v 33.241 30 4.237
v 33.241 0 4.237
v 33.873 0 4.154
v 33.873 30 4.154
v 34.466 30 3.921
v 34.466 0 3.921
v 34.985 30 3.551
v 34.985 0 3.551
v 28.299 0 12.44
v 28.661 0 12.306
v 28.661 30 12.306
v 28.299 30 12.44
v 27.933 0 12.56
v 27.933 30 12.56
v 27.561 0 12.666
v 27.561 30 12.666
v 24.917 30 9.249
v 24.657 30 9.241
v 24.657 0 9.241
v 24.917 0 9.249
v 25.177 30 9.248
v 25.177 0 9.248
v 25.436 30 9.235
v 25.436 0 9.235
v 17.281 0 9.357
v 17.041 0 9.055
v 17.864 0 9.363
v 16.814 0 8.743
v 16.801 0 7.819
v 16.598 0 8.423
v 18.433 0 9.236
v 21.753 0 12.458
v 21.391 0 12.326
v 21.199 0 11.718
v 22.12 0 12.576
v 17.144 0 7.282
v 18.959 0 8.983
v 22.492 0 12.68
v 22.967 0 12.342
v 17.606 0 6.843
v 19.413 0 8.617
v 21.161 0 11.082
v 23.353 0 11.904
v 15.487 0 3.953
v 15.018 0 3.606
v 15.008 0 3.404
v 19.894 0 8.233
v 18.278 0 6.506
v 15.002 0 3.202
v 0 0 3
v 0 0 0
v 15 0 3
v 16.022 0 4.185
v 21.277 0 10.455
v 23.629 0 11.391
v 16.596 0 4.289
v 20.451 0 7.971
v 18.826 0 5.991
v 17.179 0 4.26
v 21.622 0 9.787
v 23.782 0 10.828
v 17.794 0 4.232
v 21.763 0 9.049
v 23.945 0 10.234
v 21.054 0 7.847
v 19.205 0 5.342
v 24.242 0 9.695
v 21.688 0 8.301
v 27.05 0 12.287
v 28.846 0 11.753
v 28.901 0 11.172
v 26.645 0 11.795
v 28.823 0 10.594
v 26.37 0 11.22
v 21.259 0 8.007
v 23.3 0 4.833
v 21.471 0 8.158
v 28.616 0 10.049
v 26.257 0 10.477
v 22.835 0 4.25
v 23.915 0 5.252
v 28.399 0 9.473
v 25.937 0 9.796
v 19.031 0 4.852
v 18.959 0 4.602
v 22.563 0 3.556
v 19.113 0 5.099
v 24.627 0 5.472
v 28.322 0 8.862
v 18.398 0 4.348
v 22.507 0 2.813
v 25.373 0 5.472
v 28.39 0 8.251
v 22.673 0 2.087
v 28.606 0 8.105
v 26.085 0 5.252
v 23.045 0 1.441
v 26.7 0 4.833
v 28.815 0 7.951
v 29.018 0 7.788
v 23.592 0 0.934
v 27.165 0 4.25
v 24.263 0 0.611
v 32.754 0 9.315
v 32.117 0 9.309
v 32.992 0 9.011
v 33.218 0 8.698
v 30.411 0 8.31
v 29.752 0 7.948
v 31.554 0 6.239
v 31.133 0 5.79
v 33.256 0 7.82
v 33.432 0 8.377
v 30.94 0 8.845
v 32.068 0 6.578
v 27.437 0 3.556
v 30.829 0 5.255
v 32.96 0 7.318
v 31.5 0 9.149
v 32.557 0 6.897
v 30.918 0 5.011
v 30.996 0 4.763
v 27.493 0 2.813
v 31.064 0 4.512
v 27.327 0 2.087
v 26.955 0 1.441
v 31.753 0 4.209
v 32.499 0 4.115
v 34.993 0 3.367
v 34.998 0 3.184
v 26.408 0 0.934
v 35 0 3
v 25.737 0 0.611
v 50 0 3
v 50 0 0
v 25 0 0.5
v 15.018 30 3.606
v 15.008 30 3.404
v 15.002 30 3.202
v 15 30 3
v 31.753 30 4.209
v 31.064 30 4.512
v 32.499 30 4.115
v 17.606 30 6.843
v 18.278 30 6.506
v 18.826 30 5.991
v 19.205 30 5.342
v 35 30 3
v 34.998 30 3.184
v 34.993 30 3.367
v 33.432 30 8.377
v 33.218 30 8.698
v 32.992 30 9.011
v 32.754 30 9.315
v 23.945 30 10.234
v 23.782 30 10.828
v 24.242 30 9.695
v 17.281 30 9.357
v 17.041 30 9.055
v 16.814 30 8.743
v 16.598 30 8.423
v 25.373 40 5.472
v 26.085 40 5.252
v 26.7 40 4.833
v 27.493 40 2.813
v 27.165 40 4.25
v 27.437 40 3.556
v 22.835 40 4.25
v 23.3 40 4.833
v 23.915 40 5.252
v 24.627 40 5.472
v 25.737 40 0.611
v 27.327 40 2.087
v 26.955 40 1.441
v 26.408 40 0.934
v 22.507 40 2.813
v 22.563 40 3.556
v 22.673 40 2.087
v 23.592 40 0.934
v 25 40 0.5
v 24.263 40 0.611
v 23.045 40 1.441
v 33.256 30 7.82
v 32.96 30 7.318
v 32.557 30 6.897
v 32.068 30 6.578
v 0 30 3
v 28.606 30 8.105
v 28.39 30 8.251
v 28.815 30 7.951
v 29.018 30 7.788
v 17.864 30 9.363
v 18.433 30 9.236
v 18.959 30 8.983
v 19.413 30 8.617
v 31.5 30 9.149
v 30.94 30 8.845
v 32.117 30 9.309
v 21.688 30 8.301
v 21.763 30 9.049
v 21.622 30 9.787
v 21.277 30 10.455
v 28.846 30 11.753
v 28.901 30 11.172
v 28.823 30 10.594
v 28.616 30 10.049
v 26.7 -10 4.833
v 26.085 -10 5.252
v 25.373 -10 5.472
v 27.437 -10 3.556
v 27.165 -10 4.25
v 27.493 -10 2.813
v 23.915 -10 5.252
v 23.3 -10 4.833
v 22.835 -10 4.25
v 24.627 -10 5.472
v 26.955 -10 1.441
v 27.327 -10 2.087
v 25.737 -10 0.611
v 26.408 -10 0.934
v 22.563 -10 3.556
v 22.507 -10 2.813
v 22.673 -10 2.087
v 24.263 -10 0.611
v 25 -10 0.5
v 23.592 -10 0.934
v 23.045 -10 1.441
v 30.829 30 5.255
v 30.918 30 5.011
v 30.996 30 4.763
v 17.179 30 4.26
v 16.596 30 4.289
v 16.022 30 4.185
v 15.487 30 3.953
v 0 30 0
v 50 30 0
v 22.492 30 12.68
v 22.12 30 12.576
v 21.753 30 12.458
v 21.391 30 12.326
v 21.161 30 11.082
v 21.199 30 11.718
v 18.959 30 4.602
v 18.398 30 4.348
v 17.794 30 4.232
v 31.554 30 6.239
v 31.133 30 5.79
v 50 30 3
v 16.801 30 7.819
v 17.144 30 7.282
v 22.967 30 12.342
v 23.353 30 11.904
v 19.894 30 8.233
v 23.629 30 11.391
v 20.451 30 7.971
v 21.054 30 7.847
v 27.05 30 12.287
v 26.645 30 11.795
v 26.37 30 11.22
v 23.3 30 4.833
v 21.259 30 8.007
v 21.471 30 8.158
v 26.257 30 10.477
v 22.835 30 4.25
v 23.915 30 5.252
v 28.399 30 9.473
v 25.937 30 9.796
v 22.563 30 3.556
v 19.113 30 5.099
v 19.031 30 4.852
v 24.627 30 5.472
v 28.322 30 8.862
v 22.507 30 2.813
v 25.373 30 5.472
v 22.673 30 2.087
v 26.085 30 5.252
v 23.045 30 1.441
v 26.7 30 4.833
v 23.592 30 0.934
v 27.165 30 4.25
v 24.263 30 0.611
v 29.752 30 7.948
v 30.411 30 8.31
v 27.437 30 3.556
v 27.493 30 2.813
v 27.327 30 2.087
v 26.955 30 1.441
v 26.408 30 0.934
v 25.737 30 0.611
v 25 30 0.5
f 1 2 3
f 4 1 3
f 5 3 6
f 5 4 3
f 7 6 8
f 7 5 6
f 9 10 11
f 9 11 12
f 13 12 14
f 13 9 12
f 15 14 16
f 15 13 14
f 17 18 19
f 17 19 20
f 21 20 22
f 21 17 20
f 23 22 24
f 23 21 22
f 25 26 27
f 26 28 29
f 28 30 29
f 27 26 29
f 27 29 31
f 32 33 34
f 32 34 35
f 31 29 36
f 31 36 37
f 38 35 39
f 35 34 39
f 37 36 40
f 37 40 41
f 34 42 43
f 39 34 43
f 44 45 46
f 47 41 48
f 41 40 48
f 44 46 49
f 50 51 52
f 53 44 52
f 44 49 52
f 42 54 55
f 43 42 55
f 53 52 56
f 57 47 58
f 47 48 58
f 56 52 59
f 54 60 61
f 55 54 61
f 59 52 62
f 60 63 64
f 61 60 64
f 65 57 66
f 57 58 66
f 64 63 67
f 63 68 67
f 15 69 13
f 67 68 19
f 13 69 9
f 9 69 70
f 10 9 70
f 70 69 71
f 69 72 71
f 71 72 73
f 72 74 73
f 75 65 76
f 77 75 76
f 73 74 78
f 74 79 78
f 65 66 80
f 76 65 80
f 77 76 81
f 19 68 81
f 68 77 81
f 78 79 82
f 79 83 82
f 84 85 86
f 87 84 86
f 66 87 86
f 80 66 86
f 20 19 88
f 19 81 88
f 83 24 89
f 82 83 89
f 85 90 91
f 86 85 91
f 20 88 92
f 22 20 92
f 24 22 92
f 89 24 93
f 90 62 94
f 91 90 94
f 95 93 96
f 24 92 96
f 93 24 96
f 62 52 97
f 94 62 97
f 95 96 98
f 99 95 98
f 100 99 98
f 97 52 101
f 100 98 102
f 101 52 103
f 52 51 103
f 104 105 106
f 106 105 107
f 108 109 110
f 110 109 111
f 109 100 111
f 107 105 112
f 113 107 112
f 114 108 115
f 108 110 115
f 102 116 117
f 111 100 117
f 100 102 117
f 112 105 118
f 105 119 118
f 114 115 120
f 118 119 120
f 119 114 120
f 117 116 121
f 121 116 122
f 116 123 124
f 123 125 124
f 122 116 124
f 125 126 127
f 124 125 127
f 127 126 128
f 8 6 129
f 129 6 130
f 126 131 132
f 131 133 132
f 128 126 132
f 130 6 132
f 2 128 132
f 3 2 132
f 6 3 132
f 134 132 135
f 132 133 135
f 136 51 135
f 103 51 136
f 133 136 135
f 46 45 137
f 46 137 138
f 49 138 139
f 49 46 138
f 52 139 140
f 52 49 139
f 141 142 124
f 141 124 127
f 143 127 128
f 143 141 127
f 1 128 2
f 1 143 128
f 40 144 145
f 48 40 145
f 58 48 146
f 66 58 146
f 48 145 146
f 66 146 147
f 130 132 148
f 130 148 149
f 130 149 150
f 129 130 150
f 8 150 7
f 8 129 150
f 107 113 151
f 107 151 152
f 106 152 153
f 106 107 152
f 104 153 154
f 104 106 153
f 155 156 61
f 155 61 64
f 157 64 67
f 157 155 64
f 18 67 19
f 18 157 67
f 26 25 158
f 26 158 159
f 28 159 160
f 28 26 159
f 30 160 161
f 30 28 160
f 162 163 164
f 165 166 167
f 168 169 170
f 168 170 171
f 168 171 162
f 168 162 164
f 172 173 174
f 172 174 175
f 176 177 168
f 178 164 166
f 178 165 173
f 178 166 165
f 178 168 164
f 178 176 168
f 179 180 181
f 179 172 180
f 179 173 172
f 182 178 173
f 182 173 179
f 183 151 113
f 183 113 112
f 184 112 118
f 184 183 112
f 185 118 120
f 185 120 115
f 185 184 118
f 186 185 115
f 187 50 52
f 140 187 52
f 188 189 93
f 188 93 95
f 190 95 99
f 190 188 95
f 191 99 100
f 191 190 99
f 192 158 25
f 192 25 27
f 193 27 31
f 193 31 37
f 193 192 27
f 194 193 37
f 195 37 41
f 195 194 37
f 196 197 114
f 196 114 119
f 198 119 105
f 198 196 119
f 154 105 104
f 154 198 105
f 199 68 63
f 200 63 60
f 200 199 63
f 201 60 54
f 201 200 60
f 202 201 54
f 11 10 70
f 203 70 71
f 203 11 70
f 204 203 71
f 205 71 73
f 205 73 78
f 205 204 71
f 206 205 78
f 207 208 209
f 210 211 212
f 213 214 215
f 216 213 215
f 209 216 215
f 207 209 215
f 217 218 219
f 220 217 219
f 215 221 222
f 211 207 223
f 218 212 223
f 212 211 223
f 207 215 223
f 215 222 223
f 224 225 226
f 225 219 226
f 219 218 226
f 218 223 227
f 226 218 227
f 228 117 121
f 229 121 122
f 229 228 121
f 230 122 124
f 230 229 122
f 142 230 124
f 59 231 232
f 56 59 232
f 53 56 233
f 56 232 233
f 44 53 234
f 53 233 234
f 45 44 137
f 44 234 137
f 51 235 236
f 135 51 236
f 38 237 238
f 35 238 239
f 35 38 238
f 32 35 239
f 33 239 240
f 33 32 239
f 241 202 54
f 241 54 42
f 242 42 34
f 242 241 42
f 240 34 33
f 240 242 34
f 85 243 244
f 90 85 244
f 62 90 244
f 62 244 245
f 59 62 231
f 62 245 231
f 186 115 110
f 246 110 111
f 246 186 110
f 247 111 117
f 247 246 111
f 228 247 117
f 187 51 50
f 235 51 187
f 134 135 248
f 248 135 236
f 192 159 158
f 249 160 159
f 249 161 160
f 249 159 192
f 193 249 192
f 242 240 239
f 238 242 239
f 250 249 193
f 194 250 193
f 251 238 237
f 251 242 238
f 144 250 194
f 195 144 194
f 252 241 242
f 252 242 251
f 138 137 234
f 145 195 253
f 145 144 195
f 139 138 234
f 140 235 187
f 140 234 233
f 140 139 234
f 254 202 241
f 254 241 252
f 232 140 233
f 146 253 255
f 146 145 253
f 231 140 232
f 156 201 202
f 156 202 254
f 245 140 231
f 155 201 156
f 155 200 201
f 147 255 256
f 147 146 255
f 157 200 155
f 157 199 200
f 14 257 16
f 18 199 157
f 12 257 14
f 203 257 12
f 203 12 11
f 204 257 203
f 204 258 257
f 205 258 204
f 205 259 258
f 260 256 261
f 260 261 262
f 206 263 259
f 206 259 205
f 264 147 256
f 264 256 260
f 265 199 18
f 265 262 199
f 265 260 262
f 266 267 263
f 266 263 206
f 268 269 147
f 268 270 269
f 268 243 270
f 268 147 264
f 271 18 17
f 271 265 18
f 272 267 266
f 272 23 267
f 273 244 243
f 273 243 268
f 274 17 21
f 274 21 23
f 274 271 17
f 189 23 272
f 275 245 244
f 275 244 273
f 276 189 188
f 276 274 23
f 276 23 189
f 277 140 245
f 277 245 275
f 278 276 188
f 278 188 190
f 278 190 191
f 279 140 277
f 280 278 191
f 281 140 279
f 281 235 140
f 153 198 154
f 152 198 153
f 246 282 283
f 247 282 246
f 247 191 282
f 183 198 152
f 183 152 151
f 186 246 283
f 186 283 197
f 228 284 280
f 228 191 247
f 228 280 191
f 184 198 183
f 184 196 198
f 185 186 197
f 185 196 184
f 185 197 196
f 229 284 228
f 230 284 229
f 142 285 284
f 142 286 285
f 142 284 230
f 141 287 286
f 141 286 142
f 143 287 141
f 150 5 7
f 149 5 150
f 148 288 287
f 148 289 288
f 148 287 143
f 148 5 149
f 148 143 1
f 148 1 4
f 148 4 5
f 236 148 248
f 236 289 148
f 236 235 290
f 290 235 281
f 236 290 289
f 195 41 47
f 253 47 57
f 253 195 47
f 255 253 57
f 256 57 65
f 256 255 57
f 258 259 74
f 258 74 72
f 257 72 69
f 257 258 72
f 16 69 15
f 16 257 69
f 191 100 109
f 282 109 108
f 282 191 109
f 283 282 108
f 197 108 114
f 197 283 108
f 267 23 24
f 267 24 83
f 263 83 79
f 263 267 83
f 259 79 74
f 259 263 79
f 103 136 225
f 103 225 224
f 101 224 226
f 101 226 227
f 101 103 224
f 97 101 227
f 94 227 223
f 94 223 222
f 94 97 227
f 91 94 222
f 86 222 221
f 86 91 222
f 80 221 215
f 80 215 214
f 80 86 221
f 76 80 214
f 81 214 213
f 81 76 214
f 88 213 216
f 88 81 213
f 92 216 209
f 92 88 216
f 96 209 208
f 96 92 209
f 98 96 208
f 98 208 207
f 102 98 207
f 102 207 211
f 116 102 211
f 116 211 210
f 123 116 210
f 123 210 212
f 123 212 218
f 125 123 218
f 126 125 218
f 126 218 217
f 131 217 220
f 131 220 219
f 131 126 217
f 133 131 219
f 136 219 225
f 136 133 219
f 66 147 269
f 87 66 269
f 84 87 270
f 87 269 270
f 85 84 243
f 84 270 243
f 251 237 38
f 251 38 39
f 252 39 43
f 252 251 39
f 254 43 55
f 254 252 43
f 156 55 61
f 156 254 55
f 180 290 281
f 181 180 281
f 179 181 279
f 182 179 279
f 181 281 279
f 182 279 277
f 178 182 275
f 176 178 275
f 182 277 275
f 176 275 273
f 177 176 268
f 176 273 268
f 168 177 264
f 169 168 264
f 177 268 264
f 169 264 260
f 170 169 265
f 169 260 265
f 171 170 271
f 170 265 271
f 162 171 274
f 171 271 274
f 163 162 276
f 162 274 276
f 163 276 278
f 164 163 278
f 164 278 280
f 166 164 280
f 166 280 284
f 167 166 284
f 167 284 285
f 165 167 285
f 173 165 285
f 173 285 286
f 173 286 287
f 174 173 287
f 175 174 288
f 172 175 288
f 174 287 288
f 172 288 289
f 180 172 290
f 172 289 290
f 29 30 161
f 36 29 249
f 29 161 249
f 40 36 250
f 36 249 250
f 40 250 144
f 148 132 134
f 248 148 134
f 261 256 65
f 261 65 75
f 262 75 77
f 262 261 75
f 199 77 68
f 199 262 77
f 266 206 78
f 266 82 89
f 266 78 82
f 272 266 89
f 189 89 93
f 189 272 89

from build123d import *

# Parameters (mm, degrees)
CROQUIS1_W                   = 50
CROQUIS1_H                   = 30
SALIENTE_EXTRUIR1_DEPTH      = 3
SALIENTE_EXTRUIR2_DEPTH      = 15
SALIENTE_EXTRUIR2_DEPTH_BACK = 15
CORTAR_EXTRUIR1_DEPTH        = 60.741108125
CROQUIS4_R                   = 2.5
SALIENTE_EXTRUIR3_DEPTH      = 10


with BuildPart() as part:
    # Croquis1 → Saliente-Extruir1 (new body)
    with BuildSketch(Plane.XY):
        with Locations((25, 15)):
            Rectangle(CROQUIS1_W, CROQUIS1_H)
    extrude(amount=SALIENTE_EXTRUIR1_DEPTH)

    # Croquis2 → Saliente-Extruir2 (add, two sides: drawn at the far end of the back side and taken through both)
    with BuildSketch(Plane(origin=(0, 15, 0), x_dir=(1, 0, 0), z_dir=(0, 1, 0)).offset(-SALIENTE_EXTRUIR2_DEPTH_BACK)):
        with BuildLine():
            Line((15, -3), (35, -3))
            ThreePointArc((35, -3), (25, -13), (15, -3))
        make_face()
    extrude(amount=SALIENTE_EXTRUIR2_DEPTH + SALIENTE_EXTRUIR2_DEPTH_BACK)

    # Croquis3 → Cortar-Extruir1 (cut, through all)
    with BuildSketch(Plane(origin=(0, 30, 0), x_dir=(1, 0, 0), z_dir=(0, 1, 0))):
        with BuildLine():
            ThreePointArc((17.281029865, -9.357475919), (18.433447729, -9.235618719), (19.413280597, -8.616875104))
            ThreePointArc((19.413280597, -8.616875104), (20.164937796, -8.08539476), (21.05409871, -7.846956572))
            ThreePointArc((21.05409871, -7.846956572), (21.364087604, -8.083627253), (21.688234212, -8.300503029))
            ThreePointArc((21.688234212, -8.300503029), (21.719260259, -9.423145978), (21.277056507, -10.455495555))
            ThreePointArc((21.277056507, -10.455495555), (21.160716532, -11.401170735), (21.390501043, -12.325852094))
            ThreePointArc((21.390501043, -12.325852094), (19.144543803, -11.106394558), (17.281029865, -9.357475919))
        make_face()
        with BuildLine():
            ThreePointArc((17.605845109, -6.843331325), (18.570395316, -6.268063818), (19.205167685, -5.34158994))
            ThreePointArc((19.205167685, -5.34158994), (19.070403954, -4.975605156), (18.958729207, -4.601927653))
            ThreePointArc((18.958729207, -4.601927653), (18.099232466, -4.272192527), (17.17873271, -4.260356141))
            ThreePointArc((17.17873271, -4.260356141), (16.022342896, -4.184998931), (15.018391395, -3.606209252))
            ThreePointArc((15.018391395, -3.606209252), (15.498017257, -6.116460163), (16.598255677, -8.423162576))
            ThreePointArc((16.598255677, -8.423162576), (16.955870168, -7.540015696), (17.605845109, -6.843331325))
        make_face()
        with BuildLine():
            ThreePointArc((22.492052569, -12.680402868), (23.35275234, -11.904444098), (23.781765411, -10.827938688))
            ThreePointArc((23.781765411, -10.827938688), (24.07747255, -9.956149042), (24.65666839, -9.240612823))
            ThreePointArc((24.65666839, -9.240612823), (25.046566209, -9.249876526), (25.436282706, -9.234804119))
            ThreePointArc((25.436282706, -9.234804119), (26.121256275, -10.12480469), (26.370305781, -11.219913886))
            ThreePointArc((26.370305781, -11.219913886), (26.832038689, -12.053364099), (27.561452328, -12.666383086))
            ThreePointArc((27.561452328, -12.666383086), (25.027655598, -12.999961758), (22.492052569, -12.680402868))
        make_face()
        with BuildLine():
            ThreePointArc((28.661025949, -12.305744946), (28.90124957, -11.172074481), (28.615574431, -10.048995755))
            ThreePointArc((28.615574431, -10.048995755), (28.342381435, -9.16989082), (28.390379076, -8.250567086))
            ThreePointArc((28.390379076, -8.250567086), (28.711258105, -8.028885391), (29.017686036, -7.787621948))
            ThreePointArc((29.017686036, -7.787621948), (30.094970504, -8.105030174), (30.940144821, -8.844604497))
            ThreePointArc((30.940144821, -8.844604497), (31.803584335, -9.24748009), (32.754015885, -9.314684288))
            ThreePointArc((32.754015885, -9.314684288), (30.900203893, -11.073883453), (28.661025949, -12.305744946))
        make_face()
        with BuildLine():
            ThreePointArc((33.43161185, -8.376608746), (32.959602062, -7.318250172), (32.068356907, -6.57757603))
            ThreePointArc((32.068356907, -6.57757603), (31.330614215, -6.026944012), (30.829080189, -5.254983182))
            ThreePointArc((30.829080189, -5.254983182), (30.958375546, -4.887030963), (31.064469856, -4.511730919))
            ThreePointArc((31.064469856, -4.511730919), (32.122579172, -4.135307644), (33.241050438, -4.236854841))
            ThreePointArc((33.241050438, -4.236854841), (34.17639201, -4.05527103), (34.984808923, -3.55099072))
            ThreePointArc((34.984808923, -3.55099072), (34.519074843, -6.06385609), (33.43161185, -8.376608746))
        make_face()
    extrude(amount=-CORTAR_EXTRUIR1_DEPTH, mode=Mode.SUBTRACT)

    # Croquis4 → Saliente-Extruir3 (add)
    with BuildSketch(Plane(origin=(0, 30, 0), x_dir=(1, 0, 0), z_dir=(0, 1, 0))):
        with Locations(Location((25, -3, 0), (0, 0, 90))):
            Circle(CROQUIS4_R)
    saliente_extruir3 = extrude(amount=SALIENTE_EXTRUIR3_DEPTH)

    # Simetría2: Saliente-Extruir3 across plane
    add(saliente_extruir3.mirror(Plane.ZX.offset(15)))


solid = part.part
